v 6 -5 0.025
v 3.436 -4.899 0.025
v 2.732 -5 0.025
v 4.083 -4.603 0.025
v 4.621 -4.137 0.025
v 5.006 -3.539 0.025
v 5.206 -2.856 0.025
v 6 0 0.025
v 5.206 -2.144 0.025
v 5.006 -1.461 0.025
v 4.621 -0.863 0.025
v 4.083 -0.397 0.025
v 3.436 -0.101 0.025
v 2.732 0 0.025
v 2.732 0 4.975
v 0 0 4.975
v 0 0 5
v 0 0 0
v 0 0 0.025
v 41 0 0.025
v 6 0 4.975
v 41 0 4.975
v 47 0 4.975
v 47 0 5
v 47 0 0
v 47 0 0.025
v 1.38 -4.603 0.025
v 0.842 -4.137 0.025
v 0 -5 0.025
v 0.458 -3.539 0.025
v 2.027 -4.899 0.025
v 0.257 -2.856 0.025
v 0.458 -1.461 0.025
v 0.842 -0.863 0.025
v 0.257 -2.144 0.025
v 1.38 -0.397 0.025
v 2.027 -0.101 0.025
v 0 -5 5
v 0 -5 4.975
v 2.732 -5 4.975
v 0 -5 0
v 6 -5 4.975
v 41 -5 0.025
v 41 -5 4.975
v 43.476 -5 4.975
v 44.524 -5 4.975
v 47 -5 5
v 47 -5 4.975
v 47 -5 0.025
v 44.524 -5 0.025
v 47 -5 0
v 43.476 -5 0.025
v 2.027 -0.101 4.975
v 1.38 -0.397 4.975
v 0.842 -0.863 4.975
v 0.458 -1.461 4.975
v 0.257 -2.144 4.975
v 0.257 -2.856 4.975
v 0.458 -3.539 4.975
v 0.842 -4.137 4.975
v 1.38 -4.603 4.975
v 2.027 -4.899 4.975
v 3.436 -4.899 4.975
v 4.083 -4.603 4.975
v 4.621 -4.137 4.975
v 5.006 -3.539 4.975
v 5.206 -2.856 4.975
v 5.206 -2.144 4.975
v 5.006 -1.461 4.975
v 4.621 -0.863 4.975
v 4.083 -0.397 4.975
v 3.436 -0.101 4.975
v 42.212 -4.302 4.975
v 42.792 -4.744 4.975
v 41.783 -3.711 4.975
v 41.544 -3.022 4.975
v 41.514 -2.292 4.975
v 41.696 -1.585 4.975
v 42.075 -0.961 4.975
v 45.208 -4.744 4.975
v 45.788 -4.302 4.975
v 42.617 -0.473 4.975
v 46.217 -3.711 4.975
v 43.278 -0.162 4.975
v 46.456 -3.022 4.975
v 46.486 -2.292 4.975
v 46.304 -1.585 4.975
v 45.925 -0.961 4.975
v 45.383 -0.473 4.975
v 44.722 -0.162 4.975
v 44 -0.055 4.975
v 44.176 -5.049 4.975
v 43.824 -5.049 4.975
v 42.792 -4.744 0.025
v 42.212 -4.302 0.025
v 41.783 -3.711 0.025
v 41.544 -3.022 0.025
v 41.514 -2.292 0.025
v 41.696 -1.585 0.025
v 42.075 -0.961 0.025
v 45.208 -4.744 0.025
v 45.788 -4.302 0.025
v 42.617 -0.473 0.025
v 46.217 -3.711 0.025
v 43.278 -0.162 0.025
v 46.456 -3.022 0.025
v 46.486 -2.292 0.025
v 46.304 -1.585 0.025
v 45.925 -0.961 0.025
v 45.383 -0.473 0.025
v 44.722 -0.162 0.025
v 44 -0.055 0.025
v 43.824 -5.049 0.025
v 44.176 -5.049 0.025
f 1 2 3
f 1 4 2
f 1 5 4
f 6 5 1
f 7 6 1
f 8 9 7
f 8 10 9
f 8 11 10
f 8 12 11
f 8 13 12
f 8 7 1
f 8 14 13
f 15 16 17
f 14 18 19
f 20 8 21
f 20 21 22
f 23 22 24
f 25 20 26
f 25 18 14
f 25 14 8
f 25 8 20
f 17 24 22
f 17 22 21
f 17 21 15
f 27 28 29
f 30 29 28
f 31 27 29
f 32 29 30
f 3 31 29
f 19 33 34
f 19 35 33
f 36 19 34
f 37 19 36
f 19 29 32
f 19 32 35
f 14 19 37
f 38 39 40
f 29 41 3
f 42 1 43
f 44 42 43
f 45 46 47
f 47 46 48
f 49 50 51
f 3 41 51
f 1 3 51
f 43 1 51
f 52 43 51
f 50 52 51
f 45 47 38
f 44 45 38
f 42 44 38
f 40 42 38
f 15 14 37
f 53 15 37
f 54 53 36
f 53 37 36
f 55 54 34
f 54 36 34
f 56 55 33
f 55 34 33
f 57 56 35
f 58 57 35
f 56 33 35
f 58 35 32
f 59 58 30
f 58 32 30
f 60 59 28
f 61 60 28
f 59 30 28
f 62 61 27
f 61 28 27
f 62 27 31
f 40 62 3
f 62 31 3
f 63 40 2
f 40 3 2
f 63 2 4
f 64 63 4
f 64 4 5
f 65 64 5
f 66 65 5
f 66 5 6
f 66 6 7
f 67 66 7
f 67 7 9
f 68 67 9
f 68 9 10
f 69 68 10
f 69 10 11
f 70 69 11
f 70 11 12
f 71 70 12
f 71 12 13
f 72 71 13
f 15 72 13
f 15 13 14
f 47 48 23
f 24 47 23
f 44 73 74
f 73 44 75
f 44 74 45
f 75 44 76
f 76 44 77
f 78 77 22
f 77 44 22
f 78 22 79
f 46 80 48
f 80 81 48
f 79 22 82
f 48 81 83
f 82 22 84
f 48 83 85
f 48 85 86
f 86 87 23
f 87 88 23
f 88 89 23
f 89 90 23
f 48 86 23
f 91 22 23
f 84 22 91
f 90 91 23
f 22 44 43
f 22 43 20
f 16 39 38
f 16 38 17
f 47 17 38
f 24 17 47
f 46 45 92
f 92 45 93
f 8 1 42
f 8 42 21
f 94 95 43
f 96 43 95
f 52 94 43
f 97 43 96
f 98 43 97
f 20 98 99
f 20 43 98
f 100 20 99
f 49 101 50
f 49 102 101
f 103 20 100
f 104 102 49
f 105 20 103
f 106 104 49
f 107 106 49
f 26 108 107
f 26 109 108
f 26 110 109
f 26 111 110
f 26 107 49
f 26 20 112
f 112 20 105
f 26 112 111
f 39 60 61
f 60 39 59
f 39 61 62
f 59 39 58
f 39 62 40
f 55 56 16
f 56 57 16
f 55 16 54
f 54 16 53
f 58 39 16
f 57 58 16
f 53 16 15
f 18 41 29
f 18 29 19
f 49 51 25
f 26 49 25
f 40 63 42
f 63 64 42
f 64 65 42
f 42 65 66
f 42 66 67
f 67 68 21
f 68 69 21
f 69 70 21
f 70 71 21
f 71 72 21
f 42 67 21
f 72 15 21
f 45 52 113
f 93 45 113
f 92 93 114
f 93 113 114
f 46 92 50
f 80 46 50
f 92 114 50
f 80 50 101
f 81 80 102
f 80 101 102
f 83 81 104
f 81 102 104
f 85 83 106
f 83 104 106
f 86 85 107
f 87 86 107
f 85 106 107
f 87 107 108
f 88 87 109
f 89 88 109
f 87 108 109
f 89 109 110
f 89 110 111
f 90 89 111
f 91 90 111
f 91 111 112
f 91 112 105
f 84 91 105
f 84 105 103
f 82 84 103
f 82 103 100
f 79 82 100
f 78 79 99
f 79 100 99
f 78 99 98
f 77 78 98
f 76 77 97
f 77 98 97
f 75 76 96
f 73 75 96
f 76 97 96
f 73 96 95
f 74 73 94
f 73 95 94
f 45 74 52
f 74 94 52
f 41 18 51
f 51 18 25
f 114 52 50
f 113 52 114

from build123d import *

# Parameters (mm, degrees)
SKETCH1_W           = 47
SKETCH1_H           = 5
BOSS_EXTRUDE1_DEPTH = 5
SKETCH3_W           = 6
SKETCH3_H           = 5.264109691
SKETCH3_H_2         = 5.408392742
CUT_EXTRUDE1_DEPTH  = 2.475
SKETCH4_R           = 2.5
BOSS_EXTRUDE2_DEPTH = 4.95
SKETCH5_R           = 2.5
BOSS_EXTRUDE3_DEPTH = 4.95


with BuildPart() as part:
    # Sketch1 → Boss-Extrude1 (new body)
    with BuildSketch(Plane.XY):
        with Locations((23.5, -2.5)):
            Rectangle(SKETCH1_W, SKETCH1_H)
    extrude(amount=BOSS_EXTRUDE1_DEPTH)

    # Sketch3 → Cut-Extrude1 (cut, symmetric)
    with BuildSketch(Plane.XY.offset(2.5)):
        with Locations((3, -2.632054846)):
            Rectangle(SKETCH3_W, SKETCH3_H)
        with Locations((44, -2.55991332)):
            Rectangle(SKETCH3_W, SKETCH3_H_2)
    extrude(amount=CUT_EXTRUDE1_DEPTH, both=True, mode=Mode.SUBTRACT)

    # Sketch4 → Boss-Extrude2 (add)
    with BuildSketch(Plane.XY.offset(0.025)):
        with Locations(Location((44, -2.555494601, 0), (0, 0, 257.905173383))):
            Circle(SKETCH4_R)
    extrude(amount=BOSS_EXTRUDE2_DEPTH)

    # Sketch5 → Boss-Extrude3 (add)
    with BuildSketch(Plane.XY.offset(0.025)):
        with Locations(Location((2.73169256, -2.5, 0), (0, 0, 90))):
            Circle(SKETCH5_R)
    extrude(amount=BOSS_EXTRUDE3_DEPTH)


solid = part.part
